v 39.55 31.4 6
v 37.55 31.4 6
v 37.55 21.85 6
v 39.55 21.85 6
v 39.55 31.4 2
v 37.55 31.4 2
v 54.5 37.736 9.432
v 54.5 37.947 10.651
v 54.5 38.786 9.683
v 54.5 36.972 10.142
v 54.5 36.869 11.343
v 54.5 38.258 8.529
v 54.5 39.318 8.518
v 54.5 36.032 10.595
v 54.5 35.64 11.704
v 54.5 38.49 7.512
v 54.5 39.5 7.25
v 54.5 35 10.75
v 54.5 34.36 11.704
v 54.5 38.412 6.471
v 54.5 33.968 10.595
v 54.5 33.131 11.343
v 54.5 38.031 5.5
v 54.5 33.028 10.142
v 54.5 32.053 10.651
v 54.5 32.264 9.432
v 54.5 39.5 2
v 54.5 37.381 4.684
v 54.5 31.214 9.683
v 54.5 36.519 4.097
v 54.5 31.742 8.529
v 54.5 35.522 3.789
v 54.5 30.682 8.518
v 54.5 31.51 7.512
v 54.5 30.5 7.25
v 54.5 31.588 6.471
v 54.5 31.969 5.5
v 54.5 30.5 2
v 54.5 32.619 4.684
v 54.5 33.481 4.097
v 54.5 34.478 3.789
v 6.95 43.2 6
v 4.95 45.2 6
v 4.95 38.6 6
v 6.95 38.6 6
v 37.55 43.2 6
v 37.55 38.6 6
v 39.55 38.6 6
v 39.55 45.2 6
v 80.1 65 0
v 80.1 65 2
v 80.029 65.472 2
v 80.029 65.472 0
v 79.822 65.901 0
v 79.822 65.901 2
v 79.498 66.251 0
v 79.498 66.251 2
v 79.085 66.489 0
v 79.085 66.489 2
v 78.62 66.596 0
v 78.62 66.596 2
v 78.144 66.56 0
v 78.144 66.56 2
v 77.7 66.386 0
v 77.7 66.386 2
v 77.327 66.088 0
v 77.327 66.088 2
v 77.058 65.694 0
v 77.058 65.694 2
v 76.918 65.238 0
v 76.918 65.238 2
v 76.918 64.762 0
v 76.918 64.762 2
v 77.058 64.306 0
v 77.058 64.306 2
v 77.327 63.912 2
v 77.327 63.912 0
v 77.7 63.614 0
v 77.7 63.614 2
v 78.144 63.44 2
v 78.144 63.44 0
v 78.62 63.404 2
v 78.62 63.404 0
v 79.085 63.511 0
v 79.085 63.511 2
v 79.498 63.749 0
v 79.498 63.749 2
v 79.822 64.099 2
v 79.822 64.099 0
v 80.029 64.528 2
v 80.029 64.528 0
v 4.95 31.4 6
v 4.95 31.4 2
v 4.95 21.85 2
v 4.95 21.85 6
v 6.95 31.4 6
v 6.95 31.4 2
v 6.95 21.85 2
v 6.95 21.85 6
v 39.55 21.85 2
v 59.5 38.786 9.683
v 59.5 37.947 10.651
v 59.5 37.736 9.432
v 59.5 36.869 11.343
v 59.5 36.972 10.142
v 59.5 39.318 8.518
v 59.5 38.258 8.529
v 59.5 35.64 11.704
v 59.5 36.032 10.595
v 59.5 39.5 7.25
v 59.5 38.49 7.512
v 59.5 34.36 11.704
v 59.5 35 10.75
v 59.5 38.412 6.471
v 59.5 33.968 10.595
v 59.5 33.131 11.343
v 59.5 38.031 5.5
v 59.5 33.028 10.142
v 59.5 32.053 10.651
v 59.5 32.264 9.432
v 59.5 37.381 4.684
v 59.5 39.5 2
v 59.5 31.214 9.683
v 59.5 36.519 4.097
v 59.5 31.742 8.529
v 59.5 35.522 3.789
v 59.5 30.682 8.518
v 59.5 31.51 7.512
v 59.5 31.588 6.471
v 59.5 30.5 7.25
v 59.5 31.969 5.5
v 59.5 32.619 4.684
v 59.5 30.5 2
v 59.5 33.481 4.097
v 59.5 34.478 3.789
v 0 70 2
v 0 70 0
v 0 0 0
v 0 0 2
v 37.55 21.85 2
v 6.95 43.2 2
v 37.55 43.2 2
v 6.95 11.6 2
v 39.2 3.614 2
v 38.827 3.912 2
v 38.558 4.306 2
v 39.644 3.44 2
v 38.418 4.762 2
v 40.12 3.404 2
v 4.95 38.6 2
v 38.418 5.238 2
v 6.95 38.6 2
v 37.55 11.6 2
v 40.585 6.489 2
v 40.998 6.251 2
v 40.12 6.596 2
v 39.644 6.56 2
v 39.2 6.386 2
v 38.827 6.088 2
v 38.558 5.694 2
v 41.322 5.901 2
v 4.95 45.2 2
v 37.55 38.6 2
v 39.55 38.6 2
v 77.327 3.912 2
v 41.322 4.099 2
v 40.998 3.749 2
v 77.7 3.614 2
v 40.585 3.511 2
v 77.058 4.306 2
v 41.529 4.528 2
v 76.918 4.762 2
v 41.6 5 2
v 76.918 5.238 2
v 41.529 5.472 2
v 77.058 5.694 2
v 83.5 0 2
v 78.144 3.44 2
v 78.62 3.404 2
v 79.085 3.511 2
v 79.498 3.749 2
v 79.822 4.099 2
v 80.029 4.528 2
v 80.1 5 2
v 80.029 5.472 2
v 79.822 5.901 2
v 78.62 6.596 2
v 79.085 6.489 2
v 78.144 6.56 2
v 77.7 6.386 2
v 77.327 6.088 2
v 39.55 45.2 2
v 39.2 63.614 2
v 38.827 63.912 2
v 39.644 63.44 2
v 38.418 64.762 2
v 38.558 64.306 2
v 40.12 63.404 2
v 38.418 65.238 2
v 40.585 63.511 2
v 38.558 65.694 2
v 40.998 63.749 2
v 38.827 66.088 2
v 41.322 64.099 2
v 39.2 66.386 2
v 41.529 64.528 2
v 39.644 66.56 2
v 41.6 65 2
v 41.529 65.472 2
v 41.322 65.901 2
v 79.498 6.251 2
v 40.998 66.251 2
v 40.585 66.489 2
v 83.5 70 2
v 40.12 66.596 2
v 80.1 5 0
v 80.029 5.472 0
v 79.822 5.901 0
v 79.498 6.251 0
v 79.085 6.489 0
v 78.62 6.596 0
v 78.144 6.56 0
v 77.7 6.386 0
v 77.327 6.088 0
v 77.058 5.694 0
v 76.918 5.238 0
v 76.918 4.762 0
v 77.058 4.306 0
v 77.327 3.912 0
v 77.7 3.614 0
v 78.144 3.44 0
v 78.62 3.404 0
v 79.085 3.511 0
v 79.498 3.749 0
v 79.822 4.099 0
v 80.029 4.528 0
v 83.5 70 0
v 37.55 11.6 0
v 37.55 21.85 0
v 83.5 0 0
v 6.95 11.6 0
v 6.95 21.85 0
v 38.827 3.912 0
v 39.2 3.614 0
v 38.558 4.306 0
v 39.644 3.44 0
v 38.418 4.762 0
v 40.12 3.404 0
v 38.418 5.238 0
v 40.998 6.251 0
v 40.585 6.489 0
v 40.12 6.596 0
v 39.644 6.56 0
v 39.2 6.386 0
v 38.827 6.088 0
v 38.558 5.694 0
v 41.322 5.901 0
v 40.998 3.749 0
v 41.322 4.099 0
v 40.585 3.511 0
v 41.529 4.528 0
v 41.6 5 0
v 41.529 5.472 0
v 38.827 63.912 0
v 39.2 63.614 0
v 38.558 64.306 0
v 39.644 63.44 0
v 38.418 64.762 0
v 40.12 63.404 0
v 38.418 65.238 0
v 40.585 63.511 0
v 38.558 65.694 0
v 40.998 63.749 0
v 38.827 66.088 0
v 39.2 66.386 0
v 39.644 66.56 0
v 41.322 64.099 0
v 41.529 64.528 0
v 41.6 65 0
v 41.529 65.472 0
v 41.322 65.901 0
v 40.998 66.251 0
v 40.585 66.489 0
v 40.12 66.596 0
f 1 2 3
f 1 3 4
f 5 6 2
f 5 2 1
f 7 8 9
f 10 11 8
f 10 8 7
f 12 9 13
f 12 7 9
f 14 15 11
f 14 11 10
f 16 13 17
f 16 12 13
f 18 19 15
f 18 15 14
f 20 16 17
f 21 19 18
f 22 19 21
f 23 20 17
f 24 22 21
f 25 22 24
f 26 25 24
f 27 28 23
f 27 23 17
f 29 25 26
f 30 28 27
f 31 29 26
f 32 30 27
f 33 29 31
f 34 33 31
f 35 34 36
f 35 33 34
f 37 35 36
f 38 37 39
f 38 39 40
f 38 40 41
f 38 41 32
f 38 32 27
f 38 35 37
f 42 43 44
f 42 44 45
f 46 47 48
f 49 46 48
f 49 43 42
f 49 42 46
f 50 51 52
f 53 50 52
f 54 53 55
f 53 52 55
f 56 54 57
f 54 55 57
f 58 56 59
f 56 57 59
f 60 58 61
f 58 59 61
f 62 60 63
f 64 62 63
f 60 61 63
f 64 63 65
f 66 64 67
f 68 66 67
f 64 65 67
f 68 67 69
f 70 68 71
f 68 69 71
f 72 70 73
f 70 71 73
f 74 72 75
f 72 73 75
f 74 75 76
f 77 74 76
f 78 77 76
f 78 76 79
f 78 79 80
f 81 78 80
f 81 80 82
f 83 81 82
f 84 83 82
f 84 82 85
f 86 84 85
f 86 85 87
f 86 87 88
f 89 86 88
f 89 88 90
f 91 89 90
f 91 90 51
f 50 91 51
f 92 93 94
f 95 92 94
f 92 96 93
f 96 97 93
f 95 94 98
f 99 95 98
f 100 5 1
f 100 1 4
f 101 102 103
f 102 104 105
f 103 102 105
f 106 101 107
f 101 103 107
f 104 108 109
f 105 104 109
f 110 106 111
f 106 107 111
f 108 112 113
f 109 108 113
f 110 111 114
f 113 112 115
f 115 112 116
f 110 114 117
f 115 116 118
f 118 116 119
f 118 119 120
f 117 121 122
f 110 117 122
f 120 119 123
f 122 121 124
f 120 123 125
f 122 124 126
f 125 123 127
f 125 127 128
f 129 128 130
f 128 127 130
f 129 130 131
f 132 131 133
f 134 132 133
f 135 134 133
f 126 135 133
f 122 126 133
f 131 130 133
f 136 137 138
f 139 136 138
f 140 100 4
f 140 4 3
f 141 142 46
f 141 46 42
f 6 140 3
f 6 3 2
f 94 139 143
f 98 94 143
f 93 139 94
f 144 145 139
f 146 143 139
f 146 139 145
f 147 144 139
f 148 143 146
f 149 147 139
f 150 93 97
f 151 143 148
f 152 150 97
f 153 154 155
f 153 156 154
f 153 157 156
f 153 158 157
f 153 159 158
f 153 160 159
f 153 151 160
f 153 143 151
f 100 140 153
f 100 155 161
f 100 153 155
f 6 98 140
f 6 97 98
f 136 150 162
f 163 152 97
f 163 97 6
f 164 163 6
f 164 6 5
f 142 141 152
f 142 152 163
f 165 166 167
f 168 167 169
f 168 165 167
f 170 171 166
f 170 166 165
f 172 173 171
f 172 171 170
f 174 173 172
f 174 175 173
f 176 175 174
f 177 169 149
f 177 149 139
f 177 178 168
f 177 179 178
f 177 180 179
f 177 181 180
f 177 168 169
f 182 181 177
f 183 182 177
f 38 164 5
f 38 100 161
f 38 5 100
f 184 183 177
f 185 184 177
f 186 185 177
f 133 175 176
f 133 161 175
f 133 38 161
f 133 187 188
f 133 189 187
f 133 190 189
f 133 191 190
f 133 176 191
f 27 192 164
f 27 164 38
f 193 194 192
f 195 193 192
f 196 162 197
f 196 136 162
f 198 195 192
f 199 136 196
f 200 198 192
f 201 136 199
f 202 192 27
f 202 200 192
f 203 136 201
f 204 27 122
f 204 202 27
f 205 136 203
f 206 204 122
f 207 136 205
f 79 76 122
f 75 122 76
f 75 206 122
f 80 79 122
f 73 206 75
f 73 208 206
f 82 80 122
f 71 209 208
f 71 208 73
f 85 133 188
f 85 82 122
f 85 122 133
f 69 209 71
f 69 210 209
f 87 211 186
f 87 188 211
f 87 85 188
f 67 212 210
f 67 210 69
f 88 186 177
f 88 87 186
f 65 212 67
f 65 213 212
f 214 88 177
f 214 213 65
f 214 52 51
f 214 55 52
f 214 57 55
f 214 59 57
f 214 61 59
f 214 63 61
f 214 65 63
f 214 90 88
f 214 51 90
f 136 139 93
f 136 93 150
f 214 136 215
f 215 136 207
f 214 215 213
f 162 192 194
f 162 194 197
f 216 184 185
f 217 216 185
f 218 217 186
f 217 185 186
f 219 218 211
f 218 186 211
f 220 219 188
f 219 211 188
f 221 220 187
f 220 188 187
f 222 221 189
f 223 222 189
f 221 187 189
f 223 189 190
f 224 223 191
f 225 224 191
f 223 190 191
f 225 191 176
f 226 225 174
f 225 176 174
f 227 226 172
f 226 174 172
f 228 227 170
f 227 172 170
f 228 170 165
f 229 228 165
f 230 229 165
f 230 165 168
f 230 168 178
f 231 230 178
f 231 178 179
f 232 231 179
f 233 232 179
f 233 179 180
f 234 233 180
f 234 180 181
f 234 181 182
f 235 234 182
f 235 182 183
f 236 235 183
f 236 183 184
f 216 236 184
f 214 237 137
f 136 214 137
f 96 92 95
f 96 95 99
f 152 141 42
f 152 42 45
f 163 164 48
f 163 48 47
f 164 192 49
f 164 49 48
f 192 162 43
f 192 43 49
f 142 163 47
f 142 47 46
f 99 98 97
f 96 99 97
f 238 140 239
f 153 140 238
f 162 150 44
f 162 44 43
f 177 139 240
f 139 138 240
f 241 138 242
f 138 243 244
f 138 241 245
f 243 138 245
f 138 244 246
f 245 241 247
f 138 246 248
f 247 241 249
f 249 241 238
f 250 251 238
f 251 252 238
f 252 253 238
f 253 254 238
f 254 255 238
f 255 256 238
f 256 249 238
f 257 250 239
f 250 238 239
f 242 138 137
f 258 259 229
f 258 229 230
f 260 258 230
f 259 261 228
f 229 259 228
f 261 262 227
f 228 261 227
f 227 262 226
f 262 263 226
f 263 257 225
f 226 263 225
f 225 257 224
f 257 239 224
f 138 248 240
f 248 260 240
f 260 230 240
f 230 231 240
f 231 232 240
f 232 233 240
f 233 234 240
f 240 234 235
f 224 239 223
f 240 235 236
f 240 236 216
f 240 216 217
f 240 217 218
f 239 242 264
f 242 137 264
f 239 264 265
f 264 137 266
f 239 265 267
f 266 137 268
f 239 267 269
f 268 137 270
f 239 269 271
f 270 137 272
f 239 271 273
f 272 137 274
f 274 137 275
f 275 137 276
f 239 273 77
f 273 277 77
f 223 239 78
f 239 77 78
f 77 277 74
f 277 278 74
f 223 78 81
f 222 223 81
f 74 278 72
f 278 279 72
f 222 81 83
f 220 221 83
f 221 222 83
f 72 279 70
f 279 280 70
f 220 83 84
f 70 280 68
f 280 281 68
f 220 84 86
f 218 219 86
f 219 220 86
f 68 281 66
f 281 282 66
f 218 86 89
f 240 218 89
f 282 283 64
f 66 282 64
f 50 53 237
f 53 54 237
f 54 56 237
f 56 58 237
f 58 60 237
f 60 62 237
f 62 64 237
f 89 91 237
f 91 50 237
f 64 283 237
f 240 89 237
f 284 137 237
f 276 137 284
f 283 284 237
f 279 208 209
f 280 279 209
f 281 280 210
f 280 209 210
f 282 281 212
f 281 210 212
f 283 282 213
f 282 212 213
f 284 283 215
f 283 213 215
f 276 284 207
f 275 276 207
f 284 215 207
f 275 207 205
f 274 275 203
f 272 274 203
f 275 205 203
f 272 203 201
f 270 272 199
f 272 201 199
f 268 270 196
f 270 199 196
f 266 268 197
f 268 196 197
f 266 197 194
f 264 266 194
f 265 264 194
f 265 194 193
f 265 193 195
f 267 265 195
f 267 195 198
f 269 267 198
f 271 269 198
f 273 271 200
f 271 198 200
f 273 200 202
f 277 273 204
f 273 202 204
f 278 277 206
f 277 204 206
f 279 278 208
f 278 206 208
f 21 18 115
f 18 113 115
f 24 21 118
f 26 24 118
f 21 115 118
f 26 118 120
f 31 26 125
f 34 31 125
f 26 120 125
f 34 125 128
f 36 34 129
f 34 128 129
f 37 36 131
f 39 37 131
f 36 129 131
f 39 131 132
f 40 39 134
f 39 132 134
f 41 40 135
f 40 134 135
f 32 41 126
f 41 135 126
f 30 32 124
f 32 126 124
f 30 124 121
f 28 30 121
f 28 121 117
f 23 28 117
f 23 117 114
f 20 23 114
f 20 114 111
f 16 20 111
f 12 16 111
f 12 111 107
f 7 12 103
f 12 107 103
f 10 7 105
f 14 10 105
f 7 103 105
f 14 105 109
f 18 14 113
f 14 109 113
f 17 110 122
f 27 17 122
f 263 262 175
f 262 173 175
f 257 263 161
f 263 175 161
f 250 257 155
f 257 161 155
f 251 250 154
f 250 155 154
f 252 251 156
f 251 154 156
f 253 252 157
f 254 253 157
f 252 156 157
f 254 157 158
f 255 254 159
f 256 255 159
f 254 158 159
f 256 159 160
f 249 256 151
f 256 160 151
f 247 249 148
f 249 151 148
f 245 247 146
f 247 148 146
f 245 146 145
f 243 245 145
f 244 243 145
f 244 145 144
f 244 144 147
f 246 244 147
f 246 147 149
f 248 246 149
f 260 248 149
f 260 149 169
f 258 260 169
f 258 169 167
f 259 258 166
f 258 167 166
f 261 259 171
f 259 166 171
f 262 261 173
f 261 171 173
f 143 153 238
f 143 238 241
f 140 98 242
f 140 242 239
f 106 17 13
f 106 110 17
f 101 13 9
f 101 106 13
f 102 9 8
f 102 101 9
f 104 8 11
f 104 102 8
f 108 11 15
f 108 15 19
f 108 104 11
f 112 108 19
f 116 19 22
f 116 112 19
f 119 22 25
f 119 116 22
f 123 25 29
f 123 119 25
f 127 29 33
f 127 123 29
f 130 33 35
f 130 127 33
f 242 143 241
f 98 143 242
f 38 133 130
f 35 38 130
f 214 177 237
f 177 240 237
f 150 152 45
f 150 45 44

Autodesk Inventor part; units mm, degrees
ref_plane "YZ Plane" through (0, 0, 0) normal (1, 0, 0) x (0, 1, 0)
sketch "Sketch1" plane through (0, 0, 0) normal (0, 0, 1) x (1, 0, 0)
  line L0 (0, 0) -> (83.5, 0)
  line L1 (83.5, 0) -> (83.5, 70)
  line L2 (83.5, 70) -> (0, 70)
  line L3 (0, 70) -> (0, 0)
  dimension "d0" = 70
  dimension "d1" = 83.5
extrude "Extrusion1" add sketch "Sketch1" along normal blind 2
sketch "Sketch2" plane through (0, 0, 2) normal (0, 0, 1) x (1, 0, 0)
  line L0 (0, 70) -> (0, 0) projected
  line L1 (0, 35) -> (83.5, 35) construction
  line L2 (83.5, 0) -> (83.5, 70) projected
  line L3 (6.95, 31.4) -> (-5, 31.4) construction
  line L4 (-5, 31.4) -> (-5, 38.6) construction
  line L5 (-5, 38.6) -> (6.95, 38.6) construction
  line L6 (6.95, 38.6) -> (6.95, 31.4) construction
  line L7 (6.95, 31.4) -> (-5, 38.6) construction
  line L8 (-5, 31.4) -> (6.95, 38.6) construction
  line L9 (49.5, 34.65) -> (49.5, 29.45) construction
  line L10 (6.95, 31.4) -> (4.95, 31.4)
  line L11 (4.95, 31.4) -> (4.95, 21.85)
  line L12 (4.95, 21.85) -> (6.95, 21.85)
  line L13 (6.95, 21.85) -> (6.95, 31.4)
  line L14 (6.95, 38.6) -> (4.95, 38.6)
  line L15 (4.95, 38.6) -> (4.95, 45.2)
  line L16 (4.95, 45.2) -> (6.95, 45.2)
  line L17 (6.95, 45.2) -> (6.95, 38.6)
  line L18 (6.95, 45.2) -> (37.55, 45.2)
  line L19 (37.55, 45.2) -> (37.55, 43.2)
  line L20 (37.55, 43.2) -> (6.95, 43.2)
  line L21 (6.95, 43.2) -> (6.95, 45.2)
  line L22 (37.55, 45.2) -> (39.55, 45.2)
  line L23 (39.55, 45.2) -> (39.55, 38.6)
  line L24 (39.55, 38.6) -> (37.55, 38.6)
  line L25 (37.55, 38.6) -> (37.55, 45.2)
  line L26 (37.55, 31.4) -> (39.55, 31.4)
  line L27 (39.55, 31.4) -> (39.55, 21.85)
  line L28 (39.55, 21.85) -> (37.55, 21.85)
  line L29 (37.55, 21.85) -> (37.55, 31.4)
  line L30 (6.95, 21.85) -> (37.55, 21.85)
  line L31 (37.55, 21.85) -> (37.55, 11.6)
  line L32 (37.55, 11.6) -> (6.95, 11.6)
  line L33 (6.95, 11.6) -> (6.95, 21.85)
  point P0 (0.975, 35)
  dimension "d8" = 7.2
  dimension "d13" = 11.95
  dimension "d14" = 5
  dimension "d19" = 2
  dimension "d20" = 23.4
  dimension "d21" = 10.25
  dimension "d22" = 30.6
  dimension "d23" = 2
  dimension "d24" = 2
  dimension "d25" = 33.6
  dimension "d30" = 11.95
extrude "Extrusion2" add sketch "Sketch2" along normal blind 4 contours L13 L12 L11 L10 | L29 L26 L27 L28 | L14 L15 L16 L17 | L17 L18 L19 L20 | L19 L22 L23 L24 L25
extrude "Extrusion3" cut sketch "Sketch2" against normal blind 2 contours L30 L31 L32 L33
ref_plane "Work Plane1" through (54.5, 0, 0) normal (-1, 0, 0) x (0, 0, 1)
sketch "Sketch3" plane through (54.5, 0, 0) normal (-1, 0, 0) x (0, 0, 1)
  arc A0 (7.25, 30.5) -> (7.25, 39.5) centre (7.25, 35) ccw
  circle A1 centre (7.25, 35) radius 3.5
  line L0 (2, 21.85) -> (2, 31.4) projected
  line L1 (7.25, 39.5) -> (2, 39.5)
  line L2 (2, 39.5) -> (2, 30.5)
  line L3 (2, 30.5) -> (7.25, 30.5)
  line L4 (7.25, 30.5) -> (7.25, 39.5) construction
  arc A2 (7.25, 39.5) -> (7.25, 30.5) centre (7.25, 35) ccw construction
  line L5 (2, 38.6) -> (6, 38.6) projected
  line L6 (2, 31.4) -> (6, 31.4) projected
  line L7 (6, 38.6) -> (6, 31.4) construction
  line L8 (6, 35) -> (7.25, 35) construction
  point P0 (0, 0)
  dimension "d32" = 9
  dimension "d33" = 7
  dimension "d34" = 5.25
ref_plane "Work Plane2" through (0, 0, 7.25) normal (0, 0, 1) x (1, 0, 0)
sketch "Sketch4" plane through (0, 0, 7.25) normal (0, 0, 1) x (1, 0, 0)
  line L0 (39.55, 38.6) -> (37.55, 38.6) projected
  line L1 (37.55, 31.4) -> (39.55, 31.4) projected
  line L2 (39.55, 38.6) -> (39.55, 31.4) construction
  line L3 (39.55, 35) -> (54.5, 35) construction
  line L4 (54.5, 35) -> (59.5, 35)
  point P0 (0, 0)
  dimension "d36" = 14.95
  dimension "d37" = 5
sweep "Sweep1" add profiles "Sketch3" path "Sketch4" path curves L4
sketch "Sketch7" plane through (0, 0, 2) normal (0, 0, 1) x (1, 0, 0)
  line L0 (40, 65) -> (78.5, 65) construction
  line L1 (78.5, 65) -> (78.5, 5) construction
  line L2 (78.5, 5) -> (40, 5) construction
  line L3 (40, 5) -> (40, 65) construction
  line L4 (83.5, 70) -> (0, 70) projected
  line L5 (0, 70) -> (0, 0) projected
  line L6 (83.5, 0) -> (83.5, 70) projected
  line L7 (0, 0) -> (83.5, 0) projected
  circle A0 centre (40, 65) radius 1.6
  circle A1 centre (78.5, 65) radius 1.6
  circle A2 centre (40, 5) radius 1.6
  circle A3 centre (78.5, 5) radius 1.6
  dimension "d54" = 5
  dimension "d55" = 40
  dimension "d56" = 5
  dimension "d57" = 5
  dimension "d58" = 3.2
  dimension "d59" = 3.2
  dimension "d60" = 3.2
  dimension "d61" = 3.2
extrude "Extrusion6" cut sketch "Sketch7" against normal blind 5 contours A0 | A1 | A2 | A3
sketch "Sketch8" plane through (0, 0, 2) normal (0, 0, 1) x (1, 0, 0)
  circle A0 centre (40, 65) radius 1.6 projected
  line L0 (40, 68.4641) -> (43, 66.7321)
  line L1 (43, 66.7321) -> (43, 63.2679)
  line L2 (43, 63.2679) -> (40, 61.5359)
  line L3 (40, 61.5359) -> (37, 63.2679)
  line L4 (37, 63.2679) -> (37, 66.7321)
  line L5 (37, 66.7321) -> (40, 68.4641)
  line L6 (40, 69.6188) -> (44, 67.3094)
  line L7 (44, 67.3094) -> (44, 62.6906)
  line L8 (44, 62.6906) -> (40, 60.3812)
  line L9 (40, 60.3812) -> (36, 62.6906)
  line L10 (36, 62.6906) -> (36, 67.3094)
  line L11 (36, 67.3094) -> (40, 69.6188)
  circle A1 centre (78.5, 5) radius 1.6 projected
  line L12 (40, 65) -> (78.5, 65) construction
  line L13 (78.5, 65) -> (78.5, 5) construction
  line L14 (78.5, 5) -> (40, 5) construction
  line L15 (40, 5) -> (40, 65) construction
  line L16 (78.5, 61.5359) -> (75.5, 63.2679)
  line L17 (75.5, 63.2679) -> (75.5, 66.7321)
  line L18 (75.5, 66.7321) -> (78.5, 68.4641)
  line L19 (78.5, 68.4641) -> (81.5, 66.7321)
  line L20 (81.5, 66.7321) -> (81.5, 63.2679)
  line L21 (81.5, 63.2679) -> (78.5, 61.5359)
  line L22 (78.5, 60.3812) -> (74.5, 62.6906)
  line L23 (74.5, 62.6906) -> (74.5, 67.3094)
  line L24 (74.5, 67.3094) -> (78.5, 69.6188)
  line L25 (78.5, 69.6188) -> (82.5, 67.3094)
  line L26 (82.5, 67.3094) -> (82.5, 62.6906)
  line L27 (82.5, 62.6906) -> (78.5, 60.3812)
  line L28 (78.5, 8.4641) -> (81.5, 6.7321)
  line L29 (81.5, 6.7321) -> (81.5, 3.2679)
  line L30 (81.5, 3.2679) -> (78.5, 1.5359)
  line L31 (78.5, 1.5359) -> (75.5, 3.2679)
  line L32 (75.5, 3.2679) -> (75.5, 6.7321)
  line L33 (75.5, 6.7321) -> (78.5, 8.4641)
  line L34 (78.5, 9.6188) -> (82.5, 7.3094)
  line L35 (82.5, 7.3094) -> (82.5, 2.6906)
  line L36 (82.5, 2.6906) -> (78.5, 0.3812)
  line L37 (78.5, 0.3812) -> (74.5, 2.6906)
  line L38 (74.5, 2.6906) -> (74.5, 7.3094)
  line L39 (74.5, 7.3094) -> (78.5, 9.6188)
  line L40 (40, 9.6188) -> (44, 7.3094)
  line L41 (44, 7.3094) -> (44, 2.6906)
  line L42 (44, 2.6906) -> (40, 0.3812)
  line L43 (40, 0.3812) -> (36, 2.6906)
  line L44 (36, 2.6906) -> (36, 7.3094)
  line L45 (36, 7.3094) -> (40, 9.6188)
  line L46 (40, 8.4641) -> (43, 6.7321)
  line L47 (43, 6.7321) -> (43, 3.2679)
  line L48 (43, 3.2679) -> (40, 1.5359)
  line L49 (40, 1.5359) -> (37, 3.2679)
  line L50 (37, 3.2679) -> (37, 6.7321)
  line L51 (37, 6.7321) -> (40, 8.4641)
  point P0 (0, 0)
  dimension "d64" = 6
  dimension "d65" = 1
  dimension "d66" = 6
  dimension "d67" = 1
  dimension "d68" = 6
  dimension "d69" = 1
  dimension "d70" = 1
  dimension "d71" = 6
sketch "Sketch6" plane through (0, 70, 0) normal (0, 1, 0) x (1, 0, 0)
  line L0 (83.5, -2) -> (0, -2) projected
  line L1 (79, -2) -> (79, -7.25)
  arc A0 (70, -7.25) -> (79, -7.25) centre (74.5, -7.25) ccw
  line L2 (70, -7.25) -> (70, -2)
  circle A1 centre (74.5, -7.25) radius 3.5
  line L3 (39.55, -2) -> (39.55, -6) projected
  point P0 (0, 0)
  dimension "d48" = 7
  dimension "d49" = 4.5
  dimension "d50" = 5.25
  dimension "d51" = 34.95
properties part number "middleBase"
